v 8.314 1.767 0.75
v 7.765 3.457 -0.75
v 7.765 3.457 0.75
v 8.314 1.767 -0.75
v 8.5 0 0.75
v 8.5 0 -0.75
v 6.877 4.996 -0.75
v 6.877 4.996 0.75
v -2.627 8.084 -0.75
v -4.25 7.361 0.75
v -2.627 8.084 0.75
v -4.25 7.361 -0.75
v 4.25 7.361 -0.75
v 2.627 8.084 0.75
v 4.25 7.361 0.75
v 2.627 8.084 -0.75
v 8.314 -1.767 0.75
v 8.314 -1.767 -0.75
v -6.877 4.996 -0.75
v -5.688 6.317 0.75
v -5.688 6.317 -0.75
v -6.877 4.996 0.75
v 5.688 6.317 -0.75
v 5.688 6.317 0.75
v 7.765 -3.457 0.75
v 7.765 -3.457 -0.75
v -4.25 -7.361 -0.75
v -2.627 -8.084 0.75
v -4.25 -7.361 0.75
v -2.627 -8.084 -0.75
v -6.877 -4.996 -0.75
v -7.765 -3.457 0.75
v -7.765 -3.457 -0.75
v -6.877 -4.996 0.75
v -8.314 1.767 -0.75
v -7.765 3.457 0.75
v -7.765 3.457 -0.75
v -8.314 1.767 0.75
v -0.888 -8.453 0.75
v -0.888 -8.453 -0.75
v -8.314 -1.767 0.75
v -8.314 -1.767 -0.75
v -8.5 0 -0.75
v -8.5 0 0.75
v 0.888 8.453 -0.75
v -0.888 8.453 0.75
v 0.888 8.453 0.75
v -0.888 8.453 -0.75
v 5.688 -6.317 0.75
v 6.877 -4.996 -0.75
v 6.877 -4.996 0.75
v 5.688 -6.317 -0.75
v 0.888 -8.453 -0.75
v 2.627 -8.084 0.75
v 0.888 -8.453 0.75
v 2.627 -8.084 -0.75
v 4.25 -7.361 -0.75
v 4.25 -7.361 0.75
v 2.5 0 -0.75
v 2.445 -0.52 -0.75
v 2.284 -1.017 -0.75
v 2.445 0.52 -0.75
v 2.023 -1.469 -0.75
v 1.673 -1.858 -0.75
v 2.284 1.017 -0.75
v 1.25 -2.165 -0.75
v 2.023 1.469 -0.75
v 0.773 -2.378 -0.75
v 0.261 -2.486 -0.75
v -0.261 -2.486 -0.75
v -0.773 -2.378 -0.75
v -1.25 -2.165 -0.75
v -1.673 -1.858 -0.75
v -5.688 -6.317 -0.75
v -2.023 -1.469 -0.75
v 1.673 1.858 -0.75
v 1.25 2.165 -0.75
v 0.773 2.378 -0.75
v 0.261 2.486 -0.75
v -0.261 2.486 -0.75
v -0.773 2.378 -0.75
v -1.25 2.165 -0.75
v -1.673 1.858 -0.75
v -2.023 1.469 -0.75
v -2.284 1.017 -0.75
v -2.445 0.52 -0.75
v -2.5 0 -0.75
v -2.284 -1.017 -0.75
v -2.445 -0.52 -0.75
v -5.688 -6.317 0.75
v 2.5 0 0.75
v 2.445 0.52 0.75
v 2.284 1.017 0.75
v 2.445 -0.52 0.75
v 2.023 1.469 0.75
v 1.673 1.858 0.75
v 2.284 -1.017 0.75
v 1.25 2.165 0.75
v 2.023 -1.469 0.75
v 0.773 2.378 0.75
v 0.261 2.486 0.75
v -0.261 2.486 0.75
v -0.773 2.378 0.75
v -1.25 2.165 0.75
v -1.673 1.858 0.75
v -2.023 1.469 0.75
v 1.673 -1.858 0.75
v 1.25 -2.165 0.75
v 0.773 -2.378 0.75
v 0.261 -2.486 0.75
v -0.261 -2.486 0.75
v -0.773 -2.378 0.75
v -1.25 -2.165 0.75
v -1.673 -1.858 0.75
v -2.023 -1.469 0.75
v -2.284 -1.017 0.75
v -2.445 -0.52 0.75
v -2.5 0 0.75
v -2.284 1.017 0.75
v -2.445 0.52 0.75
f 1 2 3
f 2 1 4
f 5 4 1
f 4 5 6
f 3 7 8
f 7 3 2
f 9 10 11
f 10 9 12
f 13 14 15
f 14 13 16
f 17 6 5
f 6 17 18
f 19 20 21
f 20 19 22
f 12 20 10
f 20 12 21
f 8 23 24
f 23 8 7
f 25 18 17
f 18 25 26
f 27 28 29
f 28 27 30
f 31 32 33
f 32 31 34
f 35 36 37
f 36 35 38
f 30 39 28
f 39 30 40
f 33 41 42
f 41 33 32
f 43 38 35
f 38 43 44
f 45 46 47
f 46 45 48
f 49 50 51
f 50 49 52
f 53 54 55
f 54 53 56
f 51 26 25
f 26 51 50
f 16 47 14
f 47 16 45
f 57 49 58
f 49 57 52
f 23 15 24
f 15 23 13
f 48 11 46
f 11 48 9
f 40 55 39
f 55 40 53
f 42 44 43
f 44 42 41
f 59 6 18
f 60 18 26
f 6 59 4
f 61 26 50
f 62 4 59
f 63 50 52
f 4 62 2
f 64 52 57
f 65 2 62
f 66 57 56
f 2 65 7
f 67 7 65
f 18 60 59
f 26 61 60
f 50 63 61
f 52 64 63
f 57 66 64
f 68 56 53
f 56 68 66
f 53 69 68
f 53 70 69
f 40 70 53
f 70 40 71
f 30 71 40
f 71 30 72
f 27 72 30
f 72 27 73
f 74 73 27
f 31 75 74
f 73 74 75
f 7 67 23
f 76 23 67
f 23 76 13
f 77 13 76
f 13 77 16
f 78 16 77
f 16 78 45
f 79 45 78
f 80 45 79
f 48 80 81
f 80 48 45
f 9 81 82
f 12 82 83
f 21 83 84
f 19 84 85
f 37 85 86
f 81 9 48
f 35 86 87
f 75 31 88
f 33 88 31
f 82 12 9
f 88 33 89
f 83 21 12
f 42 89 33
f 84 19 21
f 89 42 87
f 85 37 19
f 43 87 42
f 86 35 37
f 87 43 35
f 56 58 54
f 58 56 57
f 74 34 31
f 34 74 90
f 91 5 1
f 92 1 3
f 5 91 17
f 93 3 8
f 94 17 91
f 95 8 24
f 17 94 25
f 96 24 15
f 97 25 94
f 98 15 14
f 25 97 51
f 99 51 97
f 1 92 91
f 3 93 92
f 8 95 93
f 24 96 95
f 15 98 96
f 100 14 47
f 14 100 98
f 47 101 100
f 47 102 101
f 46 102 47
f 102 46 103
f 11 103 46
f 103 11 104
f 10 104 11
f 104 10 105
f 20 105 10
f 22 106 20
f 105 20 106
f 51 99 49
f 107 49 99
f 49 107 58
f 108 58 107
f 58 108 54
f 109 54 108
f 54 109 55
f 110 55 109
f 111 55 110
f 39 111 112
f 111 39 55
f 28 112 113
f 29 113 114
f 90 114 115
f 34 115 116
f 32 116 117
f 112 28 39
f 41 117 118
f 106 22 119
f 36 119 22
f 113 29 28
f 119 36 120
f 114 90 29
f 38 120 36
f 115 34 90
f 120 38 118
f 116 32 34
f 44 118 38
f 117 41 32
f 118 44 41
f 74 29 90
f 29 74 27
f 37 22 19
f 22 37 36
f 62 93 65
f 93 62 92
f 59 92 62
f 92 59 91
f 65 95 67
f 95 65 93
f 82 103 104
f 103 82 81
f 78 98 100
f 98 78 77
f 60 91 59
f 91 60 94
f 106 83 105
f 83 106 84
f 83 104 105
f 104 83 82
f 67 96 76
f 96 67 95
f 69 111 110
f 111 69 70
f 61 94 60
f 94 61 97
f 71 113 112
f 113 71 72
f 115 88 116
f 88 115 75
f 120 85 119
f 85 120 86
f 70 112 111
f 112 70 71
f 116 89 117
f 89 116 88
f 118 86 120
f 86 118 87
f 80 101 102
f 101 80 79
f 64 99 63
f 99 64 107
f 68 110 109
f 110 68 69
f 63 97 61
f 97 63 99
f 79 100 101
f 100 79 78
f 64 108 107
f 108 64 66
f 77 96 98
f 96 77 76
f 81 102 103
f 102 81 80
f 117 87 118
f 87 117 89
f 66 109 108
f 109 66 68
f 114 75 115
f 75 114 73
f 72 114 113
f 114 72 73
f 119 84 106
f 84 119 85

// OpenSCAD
$fn=30;
difference() {
    cylinder(h=1.5, d=17, center=true);
    cylinder(h=1.5, d1=5, d2=5, center=true);
}
